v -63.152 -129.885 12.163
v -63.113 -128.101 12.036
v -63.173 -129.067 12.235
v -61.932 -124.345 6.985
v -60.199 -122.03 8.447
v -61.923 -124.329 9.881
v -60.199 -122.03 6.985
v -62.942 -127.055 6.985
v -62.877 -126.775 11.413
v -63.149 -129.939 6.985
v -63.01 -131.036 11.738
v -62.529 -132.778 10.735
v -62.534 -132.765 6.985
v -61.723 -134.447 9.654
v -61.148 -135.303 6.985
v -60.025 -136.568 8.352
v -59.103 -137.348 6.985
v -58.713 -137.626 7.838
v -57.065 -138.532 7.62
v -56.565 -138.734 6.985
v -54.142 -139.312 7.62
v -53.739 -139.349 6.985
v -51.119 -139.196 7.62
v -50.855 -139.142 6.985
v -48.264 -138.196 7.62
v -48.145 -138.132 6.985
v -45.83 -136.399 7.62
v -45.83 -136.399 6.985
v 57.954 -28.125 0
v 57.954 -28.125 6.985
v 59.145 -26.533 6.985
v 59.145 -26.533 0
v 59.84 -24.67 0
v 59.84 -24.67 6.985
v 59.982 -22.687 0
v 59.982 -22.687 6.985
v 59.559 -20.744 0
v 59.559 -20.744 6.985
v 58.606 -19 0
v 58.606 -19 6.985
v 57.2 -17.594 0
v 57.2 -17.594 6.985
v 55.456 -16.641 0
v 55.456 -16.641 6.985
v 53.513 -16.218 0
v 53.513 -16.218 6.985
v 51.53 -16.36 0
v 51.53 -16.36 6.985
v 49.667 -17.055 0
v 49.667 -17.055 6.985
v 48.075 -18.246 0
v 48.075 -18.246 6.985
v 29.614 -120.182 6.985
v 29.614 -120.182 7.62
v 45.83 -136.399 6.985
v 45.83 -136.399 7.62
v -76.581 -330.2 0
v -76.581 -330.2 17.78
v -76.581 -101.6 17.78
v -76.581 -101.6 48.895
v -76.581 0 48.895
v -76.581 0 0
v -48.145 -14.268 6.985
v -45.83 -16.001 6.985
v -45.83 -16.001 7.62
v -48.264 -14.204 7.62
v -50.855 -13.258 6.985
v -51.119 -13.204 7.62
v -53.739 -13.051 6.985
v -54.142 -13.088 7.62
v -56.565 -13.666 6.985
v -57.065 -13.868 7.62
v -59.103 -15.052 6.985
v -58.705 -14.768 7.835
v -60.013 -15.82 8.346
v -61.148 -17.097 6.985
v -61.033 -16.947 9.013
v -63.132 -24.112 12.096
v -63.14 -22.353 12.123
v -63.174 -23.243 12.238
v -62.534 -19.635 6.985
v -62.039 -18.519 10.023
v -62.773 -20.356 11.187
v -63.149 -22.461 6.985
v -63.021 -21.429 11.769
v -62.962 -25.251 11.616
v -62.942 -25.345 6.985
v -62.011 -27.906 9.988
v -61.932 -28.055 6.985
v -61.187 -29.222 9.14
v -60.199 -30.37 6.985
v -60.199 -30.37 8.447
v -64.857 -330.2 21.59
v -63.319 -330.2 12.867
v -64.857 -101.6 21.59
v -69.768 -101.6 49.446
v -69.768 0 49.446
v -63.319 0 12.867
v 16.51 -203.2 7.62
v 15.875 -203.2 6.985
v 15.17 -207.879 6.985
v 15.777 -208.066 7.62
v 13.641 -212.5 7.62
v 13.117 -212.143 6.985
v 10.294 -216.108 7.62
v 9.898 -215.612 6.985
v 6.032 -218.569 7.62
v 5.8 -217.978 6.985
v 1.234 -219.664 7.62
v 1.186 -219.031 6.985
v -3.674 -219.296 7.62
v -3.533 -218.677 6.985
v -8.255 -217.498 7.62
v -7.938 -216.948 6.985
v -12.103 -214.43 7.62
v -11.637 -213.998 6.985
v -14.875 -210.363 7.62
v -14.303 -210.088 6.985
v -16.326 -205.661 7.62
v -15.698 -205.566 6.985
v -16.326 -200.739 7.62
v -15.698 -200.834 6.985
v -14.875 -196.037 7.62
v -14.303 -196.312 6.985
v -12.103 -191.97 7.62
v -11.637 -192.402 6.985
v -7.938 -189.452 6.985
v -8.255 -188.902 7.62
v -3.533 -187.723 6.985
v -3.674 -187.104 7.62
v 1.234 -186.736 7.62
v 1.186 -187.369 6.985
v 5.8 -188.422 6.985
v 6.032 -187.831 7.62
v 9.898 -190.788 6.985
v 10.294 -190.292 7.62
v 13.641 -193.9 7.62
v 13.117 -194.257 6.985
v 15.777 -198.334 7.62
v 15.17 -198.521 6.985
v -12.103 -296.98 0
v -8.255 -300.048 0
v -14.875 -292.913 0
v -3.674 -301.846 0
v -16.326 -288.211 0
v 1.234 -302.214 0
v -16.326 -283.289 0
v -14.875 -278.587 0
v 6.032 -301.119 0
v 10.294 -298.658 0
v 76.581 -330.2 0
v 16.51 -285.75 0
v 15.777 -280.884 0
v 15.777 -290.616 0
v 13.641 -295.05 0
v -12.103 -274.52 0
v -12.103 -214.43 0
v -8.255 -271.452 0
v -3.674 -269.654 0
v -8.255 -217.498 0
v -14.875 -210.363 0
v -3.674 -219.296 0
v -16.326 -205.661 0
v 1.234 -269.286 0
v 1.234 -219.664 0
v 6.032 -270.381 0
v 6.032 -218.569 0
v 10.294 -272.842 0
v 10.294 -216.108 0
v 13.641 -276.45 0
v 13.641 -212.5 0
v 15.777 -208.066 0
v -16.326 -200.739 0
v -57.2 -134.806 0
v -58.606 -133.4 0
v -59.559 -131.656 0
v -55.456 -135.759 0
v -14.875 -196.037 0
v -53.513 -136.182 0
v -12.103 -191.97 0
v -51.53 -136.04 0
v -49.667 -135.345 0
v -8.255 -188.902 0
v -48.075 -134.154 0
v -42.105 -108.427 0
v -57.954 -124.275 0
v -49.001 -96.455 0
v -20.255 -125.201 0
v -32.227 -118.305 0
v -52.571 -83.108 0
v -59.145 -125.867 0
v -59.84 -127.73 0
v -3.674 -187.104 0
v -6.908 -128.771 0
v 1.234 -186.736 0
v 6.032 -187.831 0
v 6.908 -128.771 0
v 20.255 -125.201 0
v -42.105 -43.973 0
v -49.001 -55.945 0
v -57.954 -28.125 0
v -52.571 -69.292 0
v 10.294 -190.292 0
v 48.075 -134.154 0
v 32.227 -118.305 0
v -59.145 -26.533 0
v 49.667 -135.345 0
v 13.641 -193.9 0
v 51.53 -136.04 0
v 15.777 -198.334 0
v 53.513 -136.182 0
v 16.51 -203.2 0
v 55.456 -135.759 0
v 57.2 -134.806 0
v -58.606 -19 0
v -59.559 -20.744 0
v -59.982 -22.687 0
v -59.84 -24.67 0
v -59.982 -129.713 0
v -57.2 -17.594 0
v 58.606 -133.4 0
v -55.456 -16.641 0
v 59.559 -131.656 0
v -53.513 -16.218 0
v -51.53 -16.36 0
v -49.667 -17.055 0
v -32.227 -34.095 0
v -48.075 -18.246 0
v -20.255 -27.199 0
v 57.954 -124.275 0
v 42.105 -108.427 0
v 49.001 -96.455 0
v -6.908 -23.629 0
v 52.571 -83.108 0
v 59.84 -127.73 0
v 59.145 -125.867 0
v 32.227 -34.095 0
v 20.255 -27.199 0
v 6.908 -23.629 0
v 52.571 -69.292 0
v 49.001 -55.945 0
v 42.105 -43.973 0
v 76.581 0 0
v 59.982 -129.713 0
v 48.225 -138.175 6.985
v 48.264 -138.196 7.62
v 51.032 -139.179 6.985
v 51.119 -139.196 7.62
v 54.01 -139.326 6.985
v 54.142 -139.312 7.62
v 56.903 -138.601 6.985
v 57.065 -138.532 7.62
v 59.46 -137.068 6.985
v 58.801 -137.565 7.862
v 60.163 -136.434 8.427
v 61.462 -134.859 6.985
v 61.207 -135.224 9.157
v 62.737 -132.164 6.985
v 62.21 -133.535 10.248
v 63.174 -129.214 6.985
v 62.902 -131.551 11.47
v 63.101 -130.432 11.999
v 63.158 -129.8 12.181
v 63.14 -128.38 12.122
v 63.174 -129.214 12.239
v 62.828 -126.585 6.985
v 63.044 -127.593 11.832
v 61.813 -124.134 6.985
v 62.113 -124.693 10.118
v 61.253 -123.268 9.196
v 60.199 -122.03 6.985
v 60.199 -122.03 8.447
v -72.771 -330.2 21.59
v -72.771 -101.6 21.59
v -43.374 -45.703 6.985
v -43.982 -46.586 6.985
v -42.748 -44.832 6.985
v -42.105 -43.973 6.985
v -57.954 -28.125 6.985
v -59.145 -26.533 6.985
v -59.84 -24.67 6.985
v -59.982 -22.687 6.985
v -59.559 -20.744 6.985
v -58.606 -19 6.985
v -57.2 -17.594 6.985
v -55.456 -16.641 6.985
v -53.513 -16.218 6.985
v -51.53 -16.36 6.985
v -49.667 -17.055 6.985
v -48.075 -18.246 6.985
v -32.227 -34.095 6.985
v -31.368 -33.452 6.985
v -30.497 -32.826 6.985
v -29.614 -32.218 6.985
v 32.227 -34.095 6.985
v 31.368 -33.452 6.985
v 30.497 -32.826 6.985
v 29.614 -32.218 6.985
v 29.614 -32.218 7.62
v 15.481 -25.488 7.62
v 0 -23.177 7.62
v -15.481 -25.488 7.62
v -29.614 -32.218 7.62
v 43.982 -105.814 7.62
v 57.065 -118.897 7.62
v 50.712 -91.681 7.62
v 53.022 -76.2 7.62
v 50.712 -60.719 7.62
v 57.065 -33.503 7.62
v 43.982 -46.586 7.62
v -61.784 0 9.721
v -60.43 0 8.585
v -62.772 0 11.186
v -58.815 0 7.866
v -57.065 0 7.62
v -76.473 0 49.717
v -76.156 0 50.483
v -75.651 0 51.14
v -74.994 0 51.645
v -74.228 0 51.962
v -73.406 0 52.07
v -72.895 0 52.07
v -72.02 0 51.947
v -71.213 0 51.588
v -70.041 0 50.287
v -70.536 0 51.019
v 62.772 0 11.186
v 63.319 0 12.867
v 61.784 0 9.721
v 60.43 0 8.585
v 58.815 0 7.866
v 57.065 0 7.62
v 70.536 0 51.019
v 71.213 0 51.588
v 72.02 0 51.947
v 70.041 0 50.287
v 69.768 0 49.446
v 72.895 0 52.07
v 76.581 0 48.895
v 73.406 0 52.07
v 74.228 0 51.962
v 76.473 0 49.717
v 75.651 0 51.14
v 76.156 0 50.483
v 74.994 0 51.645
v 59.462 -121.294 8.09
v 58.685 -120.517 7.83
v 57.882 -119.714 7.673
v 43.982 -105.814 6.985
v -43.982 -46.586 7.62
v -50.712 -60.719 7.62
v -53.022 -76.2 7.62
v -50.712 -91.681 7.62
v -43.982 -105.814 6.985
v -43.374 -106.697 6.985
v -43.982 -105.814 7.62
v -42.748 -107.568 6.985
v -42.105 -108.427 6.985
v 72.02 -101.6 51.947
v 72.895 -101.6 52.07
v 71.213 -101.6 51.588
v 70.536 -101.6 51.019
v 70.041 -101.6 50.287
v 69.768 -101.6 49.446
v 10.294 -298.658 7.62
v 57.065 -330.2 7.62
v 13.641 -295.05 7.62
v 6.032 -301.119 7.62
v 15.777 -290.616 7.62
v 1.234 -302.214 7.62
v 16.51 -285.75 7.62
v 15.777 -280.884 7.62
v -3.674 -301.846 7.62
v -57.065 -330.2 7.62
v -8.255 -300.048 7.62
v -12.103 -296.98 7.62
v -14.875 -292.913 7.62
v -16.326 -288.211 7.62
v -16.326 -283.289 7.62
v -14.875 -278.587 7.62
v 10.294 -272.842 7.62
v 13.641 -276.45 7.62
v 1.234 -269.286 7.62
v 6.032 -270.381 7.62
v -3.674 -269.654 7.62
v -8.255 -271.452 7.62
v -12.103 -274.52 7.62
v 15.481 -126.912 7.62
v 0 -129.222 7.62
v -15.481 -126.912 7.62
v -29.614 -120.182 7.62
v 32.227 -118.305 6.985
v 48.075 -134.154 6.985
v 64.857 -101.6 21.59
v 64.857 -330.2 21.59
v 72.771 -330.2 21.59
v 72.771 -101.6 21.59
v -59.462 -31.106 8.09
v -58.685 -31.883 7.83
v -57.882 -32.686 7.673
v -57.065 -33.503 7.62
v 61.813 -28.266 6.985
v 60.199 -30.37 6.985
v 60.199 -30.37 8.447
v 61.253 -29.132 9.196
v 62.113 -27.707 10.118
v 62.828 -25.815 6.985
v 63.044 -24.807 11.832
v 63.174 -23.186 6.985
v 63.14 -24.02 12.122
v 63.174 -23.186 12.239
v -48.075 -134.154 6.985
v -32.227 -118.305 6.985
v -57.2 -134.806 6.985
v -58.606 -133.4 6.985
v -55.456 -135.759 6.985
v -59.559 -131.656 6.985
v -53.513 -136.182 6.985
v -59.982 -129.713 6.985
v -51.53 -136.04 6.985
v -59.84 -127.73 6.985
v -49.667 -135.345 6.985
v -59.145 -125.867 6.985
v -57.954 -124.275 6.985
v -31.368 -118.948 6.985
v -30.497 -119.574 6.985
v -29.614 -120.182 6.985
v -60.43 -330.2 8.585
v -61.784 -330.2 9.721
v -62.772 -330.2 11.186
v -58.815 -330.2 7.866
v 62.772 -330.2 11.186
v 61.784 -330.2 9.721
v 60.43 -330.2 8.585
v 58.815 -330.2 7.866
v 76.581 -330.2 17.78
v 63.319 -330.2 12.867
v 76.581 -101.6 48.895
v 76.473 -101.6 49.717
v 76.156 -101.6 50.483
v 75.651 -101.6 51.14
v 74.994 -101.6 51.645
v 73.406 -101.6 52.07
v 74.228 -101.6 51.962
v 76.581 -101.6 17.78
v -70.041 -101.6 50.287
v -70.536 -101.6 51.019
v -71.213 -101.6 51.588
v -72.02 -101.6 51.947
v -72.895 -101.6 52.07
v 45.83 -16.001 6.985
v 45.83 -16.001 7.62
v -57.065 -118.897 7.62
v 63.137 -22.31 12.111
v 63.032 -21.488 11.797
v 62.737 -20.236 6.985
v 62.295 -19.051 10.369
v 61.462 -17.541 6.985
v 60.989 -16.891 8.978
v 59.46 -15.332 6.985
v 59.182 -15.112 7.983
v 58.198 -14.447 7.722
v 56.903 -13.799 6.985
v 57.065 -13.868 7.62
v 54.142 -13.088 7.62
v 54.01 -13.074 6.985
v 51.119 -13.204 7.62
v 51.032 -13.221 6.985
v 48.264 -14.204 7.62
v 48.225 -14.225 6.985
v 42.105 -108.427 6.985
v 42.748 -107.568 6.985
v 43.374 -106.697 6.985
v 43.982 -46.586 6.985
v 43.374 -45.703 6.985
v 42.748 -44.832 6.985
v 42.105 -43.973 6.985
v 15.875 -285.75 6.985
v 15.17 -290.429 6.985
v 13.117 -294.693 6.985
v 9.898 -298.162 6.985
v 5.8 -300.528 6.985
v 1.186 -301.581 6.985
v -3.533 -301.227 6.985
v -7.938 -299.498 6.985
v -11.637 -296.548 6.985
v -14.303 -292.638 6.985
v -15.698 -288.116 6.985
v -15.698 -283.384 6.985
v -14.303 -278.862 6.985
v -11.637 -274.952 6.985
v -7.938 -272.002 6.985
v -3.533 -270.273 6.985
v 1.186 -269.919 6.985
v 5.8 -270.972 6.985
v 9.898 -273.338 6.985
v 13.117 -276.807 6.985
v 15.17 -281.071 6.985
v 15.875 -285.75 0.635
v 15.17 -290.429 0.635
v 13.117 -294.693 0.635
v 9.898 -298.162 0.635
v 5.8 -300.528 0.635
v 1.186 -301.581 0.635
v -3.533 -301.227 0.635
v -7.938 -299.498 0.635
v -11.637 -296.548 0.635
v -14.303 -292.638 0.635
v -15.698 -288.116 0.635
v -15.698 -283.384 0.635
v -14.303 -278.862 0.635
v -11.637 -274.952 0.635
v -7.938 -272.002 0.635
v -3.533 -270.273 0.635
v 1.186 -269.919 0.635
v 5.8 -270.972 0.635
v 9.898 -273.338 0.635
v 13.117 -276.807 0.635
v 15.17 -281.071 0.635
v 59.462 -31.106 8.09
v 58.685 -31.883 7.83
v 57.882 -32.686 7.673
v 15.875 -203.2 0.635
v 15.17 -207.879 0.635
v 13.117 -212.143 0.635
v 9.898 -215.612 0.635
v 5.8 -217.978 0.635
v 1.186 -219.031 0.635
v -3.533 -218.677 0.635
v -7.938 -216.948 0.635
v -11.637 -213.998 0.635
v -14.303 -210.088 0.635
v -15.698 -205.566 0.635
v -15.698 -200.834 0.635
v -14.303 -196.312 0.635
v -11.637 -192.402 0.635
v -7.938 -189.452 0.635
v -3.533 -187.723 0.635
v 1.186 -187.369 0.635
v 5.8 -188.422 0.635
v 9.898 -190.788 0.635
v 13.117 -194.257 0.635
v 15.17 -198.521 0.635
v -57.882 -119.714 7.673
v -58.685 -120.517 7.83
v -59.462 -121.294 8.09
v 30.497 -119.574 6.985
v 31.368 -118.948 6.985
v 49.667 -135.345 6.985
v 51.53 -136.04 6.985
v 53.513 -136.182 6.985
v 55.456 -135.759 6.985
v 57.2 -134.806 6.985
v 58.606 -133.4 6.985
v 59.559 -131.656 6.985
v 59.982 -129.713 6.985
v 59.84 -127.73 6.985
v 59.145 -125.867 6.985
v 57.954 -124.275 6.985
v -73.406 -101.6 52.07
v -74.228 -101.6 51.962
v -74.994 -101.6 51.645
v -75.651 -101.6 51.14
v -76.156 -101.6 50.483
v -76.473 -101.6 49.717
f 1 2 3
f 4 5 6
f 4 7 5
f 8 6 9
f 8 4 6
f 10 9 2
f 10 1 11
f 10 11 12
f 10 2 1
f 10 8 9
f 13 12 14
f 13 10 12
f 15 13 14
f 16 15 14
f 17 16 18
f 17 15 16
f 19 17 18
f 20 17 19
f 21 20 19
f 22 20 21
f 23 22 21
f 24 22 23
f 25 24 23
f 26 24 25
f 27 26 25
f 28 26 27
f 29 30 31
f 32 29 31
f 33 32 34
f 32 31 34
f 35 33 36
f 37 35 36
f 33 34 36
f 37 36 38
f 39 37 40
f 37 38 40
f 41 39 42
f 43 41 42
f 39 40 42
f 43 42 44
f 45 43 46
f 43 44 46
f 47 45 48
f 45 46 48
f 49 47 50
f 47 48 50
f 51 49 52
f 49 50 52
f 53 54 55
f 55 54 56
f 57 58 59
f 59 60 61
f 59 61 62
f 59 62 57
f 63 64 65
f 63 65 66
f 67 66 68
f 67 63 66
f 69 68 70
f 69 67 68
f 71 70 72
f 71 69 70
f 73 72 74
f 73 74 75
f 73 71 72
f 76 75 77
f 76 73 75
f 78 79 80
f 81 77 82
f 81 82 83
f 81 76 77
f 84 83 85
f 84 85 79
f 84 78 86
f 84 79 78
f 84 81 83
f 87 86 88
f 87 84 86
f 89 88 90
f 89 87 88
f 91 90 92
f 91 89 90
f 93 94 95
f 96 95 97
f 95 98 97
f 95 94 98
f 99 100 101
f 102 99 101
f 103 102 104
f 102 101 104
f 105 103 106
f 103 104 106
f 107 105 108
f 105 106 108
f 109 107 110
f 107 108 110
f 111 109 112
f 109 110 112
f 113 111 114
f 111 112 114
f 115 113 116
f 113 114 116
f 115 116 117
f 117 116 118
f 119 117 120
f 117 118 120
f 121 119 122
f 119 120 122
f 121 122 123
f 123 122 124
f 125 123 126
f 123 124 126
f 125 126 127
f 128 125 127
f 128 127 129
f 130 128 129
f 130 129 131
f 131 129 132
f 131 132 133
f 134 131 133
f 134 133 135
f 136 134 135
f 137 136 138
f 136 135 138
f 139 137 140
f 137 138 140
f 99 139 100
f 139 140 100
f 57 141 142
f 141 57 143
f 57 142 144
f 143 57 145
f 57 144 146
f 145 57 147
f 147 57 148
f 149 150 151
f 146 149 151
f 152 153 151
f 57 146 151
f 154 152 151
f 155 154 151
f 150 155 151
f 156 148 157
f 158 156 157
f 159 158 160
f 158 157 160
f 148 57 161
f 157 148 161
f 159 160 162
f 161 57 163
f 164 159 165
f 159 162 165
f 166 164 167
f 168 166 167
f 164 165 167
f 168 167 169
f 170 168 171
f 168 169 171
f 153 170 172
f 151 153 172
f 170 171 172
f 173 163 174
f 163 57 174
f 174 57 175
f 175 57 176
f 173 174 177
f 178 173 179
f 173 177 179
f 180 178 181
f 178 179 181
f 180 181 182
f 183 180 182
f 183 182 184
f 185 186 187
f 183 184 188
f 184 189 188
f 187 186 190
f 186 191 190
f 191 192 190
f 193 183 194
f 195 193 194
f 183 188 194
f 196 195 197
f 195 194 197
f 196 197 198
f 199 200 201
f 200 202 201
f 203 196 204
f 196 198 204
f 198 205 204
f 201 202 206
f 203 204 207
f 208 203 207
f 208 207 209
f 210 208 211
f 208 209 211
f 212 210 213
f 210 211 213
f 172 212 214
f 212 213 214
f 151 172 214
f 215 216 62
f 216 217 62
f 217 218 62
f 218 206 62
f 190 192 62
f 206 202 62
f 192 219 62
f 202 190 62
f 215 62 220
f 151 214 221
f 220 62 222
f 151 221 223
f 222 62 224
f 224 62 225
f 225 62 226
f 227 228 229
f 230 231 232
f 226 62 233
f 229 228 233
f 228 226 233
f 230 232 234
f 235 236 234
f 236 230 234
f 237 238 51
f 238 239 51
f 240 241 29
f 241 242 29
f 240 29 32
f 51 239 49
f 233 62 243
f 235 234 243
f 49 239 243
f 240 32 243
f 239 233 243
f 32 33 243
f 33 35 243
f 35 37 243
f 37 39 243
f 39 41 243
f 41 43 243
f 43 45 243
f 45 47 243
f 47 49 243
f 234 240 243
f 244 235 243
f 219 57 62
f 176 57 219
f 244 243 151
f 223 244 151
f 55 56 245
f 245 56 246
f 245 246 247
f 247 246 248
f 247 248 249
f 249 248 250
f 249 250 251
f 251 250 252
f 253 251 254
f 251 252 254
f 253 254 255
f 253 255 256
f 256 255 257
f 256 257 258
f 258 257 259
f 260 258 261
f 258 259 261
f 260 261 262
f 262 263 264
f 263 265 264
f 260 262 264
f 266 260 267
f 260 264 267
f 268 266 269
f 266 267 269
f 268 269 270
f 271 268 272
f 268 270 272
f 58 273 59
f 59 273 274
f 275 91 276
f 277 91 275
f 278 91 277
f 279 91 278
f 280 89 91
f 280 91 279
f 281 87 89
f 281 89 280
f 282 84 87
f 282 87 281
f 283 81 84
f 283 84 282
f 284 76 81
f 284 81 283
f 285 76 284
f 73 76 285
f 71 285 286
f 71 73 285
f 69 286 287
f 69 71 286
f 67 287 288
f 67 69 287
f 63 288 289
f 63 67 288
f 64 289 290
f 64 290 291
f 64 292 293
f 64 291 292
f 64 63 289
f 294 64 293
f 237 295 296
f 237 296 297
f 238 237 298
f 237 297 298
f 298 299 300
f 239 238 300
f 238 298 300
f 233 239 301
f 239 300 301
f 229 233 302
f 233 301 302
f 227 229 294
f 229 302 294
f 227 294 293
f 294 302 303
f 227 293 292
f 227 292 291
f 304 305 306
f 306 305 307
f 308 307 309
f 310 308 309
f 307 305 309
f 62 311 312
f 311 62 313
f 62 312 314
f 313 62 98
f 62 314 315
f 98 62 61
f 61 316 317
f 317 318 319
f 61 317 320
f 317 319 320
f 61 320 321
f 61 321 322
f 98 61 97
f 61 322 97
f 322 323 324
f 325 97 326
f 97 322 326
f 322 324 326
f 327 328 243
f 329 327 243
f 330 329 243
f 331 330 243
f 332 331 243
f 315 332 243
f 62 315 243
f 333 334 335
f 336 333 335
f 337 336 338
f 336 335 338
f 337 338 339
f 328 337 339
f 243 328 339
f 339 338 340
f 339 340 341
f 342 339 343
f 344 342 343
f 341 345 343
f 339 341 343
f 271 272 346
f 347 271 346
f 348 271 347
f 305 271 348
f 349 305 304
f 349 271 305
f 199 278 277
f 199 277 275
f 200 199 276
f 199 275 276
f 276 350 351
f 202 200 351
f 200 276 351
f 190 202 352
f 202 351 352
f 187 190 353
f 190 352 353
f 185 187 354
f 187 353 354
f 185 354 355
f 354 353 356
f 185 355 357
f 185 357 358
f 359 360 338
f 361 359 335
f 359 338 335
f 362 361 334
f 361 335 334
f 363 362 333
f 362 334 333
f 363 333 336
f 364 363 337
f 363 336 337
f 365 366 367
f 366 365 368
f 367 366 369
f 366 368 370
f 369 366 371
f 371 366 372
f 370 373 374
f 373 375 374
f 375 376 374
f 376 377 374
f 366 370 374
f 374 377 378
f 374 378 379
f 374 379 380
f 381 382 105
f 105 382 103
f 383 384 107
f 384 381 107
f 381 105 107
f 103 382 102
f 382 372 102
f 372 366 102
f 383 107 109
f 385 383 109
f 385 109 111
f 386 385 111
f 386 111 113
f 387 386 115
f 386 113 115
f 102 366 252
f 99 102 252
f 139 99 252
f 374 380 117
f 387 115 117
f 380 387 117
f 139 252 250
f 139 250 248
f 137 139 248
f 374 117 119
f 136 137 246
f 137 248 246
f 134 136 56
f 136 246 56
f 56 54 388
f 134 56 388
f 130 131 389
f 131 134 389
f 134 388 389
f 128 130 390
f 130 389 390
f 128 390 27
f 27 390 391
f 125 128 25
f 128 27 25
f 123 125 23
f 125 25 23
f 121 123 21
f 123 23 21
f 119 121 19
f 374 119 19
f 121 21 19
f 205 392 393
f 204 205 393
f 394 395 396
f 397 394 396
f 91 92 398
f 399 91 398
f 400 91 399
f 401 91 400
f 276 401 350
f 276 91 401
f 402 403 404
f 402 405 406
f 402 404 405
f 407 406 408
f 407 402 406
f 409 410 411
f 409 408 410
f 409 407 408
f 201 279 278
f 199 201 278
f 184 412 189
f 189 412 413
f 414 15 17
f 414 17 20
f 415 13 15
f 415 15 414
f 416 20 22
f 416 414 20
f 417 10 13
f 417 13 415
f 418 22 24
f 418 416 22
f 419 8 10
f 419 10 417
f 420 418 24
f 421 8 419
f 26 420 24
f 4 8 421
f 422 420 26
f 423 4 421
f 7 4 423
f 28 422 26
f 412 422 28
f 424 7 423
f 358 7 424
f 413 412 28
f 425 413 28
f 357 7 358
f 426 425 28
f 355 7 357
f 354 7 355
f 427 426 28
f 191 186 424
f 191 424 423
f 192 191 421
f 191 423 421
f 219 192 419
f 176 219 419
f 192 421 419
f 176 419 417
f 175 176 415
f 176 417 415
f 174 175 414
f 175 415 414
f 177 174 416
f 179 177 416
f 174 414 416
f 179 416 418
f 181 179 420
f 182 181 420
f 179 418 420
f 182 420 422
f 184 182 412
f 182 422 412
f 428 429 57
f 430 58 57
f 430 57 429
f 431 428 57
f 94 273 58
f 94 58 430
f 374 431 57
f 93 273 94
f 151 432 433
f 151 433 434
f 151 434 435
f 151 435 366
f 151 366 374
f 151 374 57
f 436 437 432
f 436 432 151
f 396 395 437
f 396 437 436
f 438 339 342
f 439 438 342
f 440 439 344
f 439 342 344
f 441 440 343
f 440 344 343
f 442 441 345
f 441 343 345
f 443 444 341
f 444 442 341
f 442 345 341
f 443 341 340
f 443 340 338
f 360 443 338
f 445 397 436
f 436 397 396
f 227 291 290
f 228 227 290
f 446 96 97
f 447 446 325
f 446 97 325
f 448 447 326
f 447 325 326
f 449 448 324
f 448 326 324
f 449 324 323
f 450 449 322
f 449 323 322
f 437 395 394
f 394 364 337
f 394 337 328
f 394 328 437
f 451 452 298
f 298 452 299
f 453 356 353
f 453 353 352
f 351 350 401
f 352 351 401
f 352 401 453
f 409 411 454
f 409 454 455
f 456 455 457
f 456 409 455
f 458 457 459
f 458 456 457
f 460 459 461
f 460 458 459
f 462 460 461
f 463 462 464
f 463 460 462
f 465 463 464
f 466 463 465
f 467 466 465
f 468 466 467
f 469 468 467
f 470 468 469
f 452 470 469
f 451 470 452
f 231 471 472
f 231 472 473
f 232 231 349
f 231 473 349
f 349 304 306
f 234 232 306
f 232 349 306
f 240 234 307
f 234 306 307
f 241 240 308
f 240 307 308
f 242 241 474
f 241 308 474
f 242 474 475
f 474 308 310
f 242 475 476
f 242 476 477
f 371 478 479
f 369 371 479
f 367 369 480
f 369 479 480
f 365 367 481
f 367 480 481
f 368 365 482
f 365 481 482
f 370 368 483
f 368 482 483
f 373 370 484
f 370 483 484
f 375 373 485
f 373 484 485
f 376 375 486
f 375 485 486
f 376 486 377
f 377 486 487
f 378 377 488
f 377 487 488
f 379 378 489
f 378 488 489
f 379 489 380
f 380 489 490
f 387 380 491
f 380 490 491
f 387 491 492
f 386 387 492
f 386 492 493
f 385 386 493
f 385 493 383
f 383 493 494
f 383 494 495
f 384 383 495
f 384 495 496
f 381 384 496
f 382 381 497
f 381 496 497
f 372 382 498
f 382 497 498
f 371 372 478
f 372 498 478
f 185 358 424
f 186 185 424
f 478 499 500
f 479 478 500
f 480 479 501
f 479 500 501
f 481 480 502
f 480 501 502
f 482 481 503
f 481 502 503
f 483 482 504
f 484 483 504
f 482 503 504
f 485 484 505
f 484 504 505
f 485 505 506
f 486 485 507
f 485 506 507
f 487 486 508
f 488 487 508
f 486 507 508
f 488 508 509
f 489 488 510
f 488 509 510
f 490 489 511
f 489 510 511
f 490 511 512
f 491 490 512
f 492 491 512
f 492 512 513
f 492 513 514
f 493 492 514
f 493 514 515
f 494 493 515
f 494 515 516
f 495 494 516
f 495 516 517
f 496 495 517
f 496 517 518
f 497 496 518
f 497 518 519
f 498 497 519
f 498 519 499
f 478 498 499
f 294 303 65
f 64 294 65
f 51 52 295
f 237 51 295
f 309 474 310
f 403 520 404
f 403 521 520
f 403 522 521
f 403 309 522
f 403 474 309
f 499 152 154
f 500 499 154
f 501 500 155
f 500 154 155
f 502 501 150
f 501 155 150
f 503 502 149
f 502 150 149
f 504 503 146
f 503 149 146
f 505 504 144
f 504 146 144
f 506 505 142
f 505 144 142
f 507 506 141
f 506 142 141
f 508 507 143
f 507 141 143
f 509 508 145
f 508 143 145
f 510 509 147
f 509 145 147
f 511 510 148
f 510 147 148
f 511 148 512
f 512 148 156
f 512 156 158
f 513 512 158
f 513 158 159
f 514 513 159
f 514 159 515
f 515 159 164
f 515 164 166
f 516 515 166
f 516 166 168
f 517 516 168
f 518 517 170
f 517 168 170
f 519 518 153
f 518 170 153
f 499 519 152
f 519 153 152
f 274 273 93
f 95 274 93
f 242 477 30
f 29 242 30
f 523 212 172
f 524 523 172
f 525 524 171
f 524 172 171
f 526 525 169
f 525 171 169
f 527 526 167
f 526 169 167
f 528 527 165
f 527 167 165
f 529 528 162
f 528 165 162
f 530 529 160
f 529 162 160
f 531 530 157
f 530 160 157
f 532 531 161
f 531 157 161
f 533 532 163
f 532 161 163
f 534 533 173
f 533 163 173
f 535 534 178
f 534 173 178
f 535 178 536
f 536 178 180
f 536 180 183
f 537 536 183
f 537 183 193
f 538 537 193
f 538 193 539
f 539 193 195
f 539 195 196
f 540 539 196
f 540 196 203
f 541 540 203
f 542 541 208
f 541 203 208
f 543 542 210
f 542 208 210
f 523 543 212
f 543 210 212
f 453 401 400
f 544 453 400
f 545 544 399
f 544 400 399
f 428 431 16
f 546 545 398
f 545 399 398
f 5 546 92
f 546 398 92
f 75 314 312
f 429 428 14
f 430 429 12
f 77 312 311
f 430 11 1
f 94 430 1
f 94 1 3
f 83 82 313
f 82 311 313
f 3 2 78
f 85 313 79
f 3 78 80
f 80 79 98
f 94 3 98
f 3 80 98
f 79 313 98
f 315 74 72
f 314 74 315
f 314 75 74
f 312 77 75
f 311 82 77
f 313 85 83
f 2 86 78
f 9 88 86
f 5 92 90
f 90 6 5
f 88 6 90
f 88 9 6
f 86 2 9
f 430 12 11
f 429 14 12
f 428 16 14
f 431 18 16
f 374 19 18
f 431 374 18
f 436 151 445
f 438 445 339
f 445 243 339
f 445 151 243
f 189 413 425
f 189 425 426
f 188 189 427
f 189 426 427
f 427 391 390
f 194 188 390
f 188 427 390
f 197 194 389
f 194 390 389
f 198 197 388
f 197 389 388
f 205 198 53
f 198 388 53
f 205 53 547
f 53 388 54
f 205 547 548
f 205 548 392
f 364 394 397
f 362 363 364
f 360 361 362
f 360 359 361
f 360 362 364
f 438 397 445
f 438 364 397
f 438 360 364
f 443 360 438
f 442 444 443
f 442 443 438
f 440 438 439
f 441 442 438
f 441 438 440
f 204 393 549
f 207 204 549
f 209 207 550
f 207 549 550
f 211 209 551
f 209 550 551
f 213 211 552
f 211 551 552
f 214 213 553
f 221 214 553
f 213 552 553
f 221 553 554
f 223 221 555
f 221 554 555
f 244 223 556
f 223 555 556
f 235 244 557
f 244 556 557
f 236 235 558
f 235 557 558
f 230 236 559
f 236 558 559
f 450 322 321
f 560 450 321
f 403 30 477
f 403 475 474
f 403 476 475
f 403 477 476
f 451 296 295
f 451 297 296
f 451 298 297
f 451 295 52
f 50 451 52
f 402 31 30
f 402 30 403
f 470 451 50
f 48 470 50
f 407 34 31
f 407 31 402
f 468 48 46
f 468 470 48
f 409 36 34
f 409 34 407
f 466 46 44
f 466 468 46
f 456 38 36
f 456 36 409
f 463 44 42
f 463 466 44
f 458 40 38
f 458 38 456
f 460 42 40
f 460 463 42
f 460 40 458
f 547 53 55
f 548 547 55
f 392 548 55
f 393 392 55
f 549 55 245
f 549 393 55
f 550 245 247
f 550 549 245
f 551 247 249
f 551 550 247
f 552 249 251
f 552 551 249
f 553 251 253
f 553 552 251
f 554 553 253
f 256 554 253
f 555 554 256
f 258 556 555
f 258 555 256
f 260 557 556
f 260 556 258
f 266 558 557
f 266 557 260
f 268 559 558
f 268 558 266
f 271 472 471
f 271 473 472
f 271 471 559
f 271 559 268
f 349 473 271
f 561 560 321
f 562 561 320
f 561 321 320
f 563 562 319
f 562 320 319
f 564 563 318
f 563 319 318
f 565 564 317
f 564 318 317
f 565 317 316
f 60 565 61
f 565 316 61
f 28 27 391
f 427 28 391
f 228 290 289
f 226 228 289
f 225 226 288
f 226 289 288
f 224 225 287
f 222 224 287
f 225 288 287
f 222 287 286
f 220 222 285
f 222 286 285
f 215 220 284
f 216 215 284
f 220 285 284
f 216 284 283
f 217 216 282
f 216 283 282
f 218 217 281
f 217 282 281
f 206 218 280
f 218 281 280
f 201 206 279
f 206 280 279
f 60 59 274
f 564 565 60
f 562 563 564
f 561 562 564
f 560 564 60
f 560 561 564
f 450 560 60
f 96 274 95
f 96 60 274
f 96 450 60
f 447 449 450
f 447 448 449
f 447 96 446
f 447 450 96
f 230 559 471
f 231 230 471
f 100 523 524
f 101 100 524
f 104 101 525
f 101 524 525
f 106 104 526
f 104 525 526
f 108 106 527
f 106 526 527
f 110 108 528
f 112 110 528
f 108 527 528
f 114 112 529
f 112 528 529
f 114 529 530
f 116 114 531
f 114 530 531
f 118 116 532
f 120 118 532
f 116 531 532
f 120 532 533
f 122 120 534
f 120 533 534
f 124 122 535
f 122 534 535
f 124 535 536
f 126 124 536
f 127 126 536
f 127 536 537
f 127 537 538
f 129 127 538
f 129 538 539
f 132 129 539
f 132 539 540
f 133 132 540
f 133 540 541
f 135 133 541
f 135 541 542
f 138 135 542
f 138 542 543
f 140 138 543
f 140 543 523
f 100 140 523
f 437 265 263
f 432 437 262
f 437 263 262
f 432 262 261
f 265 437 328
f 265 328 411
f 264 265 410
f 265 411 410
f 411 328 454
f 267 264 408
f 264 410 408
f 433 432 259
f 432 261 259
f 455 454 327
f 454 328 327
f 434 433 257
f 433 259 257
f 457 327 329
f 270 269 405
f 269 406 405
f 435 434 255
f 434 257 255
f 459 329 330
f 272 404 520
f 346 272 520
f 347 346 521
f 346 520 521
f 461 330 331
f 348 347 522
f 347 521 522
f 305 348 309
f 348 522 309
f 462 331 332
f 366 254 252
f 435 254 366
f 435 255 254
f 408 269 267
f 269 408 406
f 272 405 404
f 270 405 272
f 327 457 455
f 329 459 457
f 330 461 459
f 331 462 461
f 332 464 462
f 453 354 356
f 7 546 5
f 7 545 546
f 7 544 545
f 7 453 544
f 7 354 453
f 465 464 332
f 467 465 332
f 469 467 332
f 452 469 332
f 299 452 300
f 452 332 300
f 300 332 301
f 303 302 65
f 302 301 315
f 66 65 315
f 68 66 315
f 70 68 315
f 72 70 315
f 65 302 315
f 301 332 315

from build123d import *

# Parameters (mm, degrees)
F1_DEPTH  = 330.2
F2_W      = 165.1
F2_H      = 35.56
F3_DEPTH  = 228.6
F4_SIZE   = 3.81
F6_DEPTH  = 25.4
F8_DEPTH  = 0.635
F9_DEPTH  = 25.4
F10_R     = 15.875
F11_DEPTH = 25.4
F12_SIZE  = 0.635


with BuildPart() as f1:
    # F0 (on Front) → F1 (new body)
    with BuildSketch(Plane.XZ):
        with BuildLine():
            Line((-76.581, 48.895), (-76.581, 0))
            Line((-76.581, 0), (76.581, 0))
            Line((76.581, 0), (76.581, 48.895))
            ThreePointArc((76.581, 48.895), (75.6510640303, 51.1400640303), (73.406, 52.07))
            Line((73.406, 52.07), (72.895141329, 52.07))
            ThreePointArc((72.895141329, 52.07), (70.8542906682, 51.3271911069), (69.7683767132, 49.4463329641))
            Line((69.7683767132, 49.4463329641), (63.3185122812, 12.8673340718))
            ThreePointArc((63.3185122812, 12.8673340718), (61.146684371, 9.1056177862), (57.0649830495, 7.62))
            Line((57.0649830495, 7.62), (0, 7.62))
            Line((0, 7.62), (-57.0649830495, 7.62))
            ThreePointArc((-57.0649830495, 7.62), (-61.146684371, 9.1056177862), (-63.3185122812, 12.8673340718))
            Line((-63.3185122812, 12.8673340718), (-69.7683767132, 49.4463329641))
            ThreePointArc((-69.7683767132, 49.4463329641), (-70.8542906682, 51.3271911069), (-72.895141329, 52.07))
            Line((-72.895141329, 52.07), (-73.406, 52.07))
            ThreePointArc((-73.406, 52.07), (-75.6510640303, 51.1400640303), (-76.581, 48.895))
        make_face()
    extrude(amount=F1_DEPTH)

    # F2 (on face) → F3 (cut)
    with BuildSketch(Plane.XZ.offset(330.2)):
        with Locations((0, 39.37)):
            Rectangle(F2_W, F2_H)
    extrude(amount=-F3_DEPTH, mode=Mode.SUBTRACT)

    # F4
    f4_edges = [f1.edges().sort_by_distance(p)[0] for p in [
        (76.581, -215.9, 21.59),
        (-76.581, -215.9, 21.59),
    ]]
    chamfer(f4_edges, length=F4_SIZE)

    # F5 (on face) → F6 (cut)
    with BuildSketch(Plane.XY.offset(7.62)):
        with BuildLine():
            Line((-57.9536338645, -28.1246478687), (-42.1049536604, -43.9733280728))
            ThreePointArc((-42.1049536604, -43.9733280728), (-53.0225, -76.2), (-42.1049536604, -108.4266719272))
            Line((-42.1049536604, -108.4266719272), (-57.9536338645, -124.2753521313))
            ThreePointArc((-57.9536338645, -124.2753521313), (-57.9536338645, -134.1536338645), (-48.0753521313, -134.1536338645))
            Line((-48.0753521313, -134.1536338645), (-32.2266719272, -118.3049536604))
            ThreePointArc((-32.2266719272, -118.3049536604), (0, -129.2225), (32.2266719272, -118.3049536604))
            Line((32.2266719272, -118.3049536604), (48.0753521313, -134.1536338645))
            ThreePointArc((48.0753521313, -134.1536338645), (57.9536338645, -134.1536338645), (57.9536338645, -124.2753521313))
            Line((57.9536338645, -124.2753521313), (42.1049536604, -108.4266719272))
            ThreePointArc((42.1049536604, -108.4266719272), (53.0225, -76.2), (42.1049536604, -43.9733280728))
            Line((42.1049536604, -43.9733280728), (57.9536338645, -28.1246478687))
            ThreePointArc((57.9536338645, -28.1246478687), (57.9536338645, -18.2463661355), (48.0753521313, -18.2463661355))
            Line((48.0753521313, -18.2463661355), (32.2266719272, -34.0950463396))
            ThreePointArc((32.2266719272, -34.0950463396), (0, -23.1775), (-32.2266719272, -34.0950463396))
            Line((-32.2266719272, -34.0950463396), (-48.0753521313, -18.2463661355))
            ThreePointArc((-48.0753521313, -18.2463661355), (-57.9536338645, -18.2463661355), (-57.9536338645, -28.1246478687))
        make_face()
    extrude(amount=-F6_DEPTH, mode=Mode.SUBTRACT)

    # F7 (on face) → F8 (cut)
    with BuildSketch(Plane.XY.offset(7.62)):
        with BuildLine():
            ThreePointArc((-60.1986978948, -30.3697118989), (-49.1264293251, -32.5721230524), (-42.8544929979, -23.1855070021))
            ThreePointArc((-42.8544929979, -23.1855070021), (-43.6278769476, -19.2974433292), (-45.8302881011, -16.0013021052))
            ThreePointArc((-45.8302881011, -16.0013021052), (-60.1986978948, -16.0013021052), (-60.1986978948, -30.3697118989))
        make_face()
        with BuildLine():
            ThreePointArc((-45.8302881011, -16.0013021052), (-43.6278769476, -19.2974433292), (-42.8544929979, -23.1855070021))
            ThreePointArc((-42.8544929979, -23.1855070021), (-49.1264293251, -32.5721230524), (-60.1986978948, -30.3697118989))
            Line((-60.1986978948, -30.3697118989), (-43.1340409794, -47.4343688143))
            Line((-43.1340409794, -47.4343688143), (-28.767801471, -33.0637887353))
            Line((-28.767801471, -33.0637887353), (-45.8302881011, -16.0013021052))
        make_face()
        with BuildLine():
            ThreePointArc((-45.8302881011, -136.3986978948), (-43.6278769476, -133.1025566708), (-42.8544929979, -129.2144929979))
            ThreePointArc((-42.8544929979, -129.2144929979), (-49.1264293251, -119.8278769476), (-60.1986978948, -122.0302881011))
            ThreePointArc((-60.1986978948, -122.0302881011), (-60.1986978948, -136.3986978948), (-45.8302881011, -136.3986978948))
        make_face()
        with BuildLine():
            ThreePointArc((-60.1986978948, -122.0302881011), (-49.1264293251, -119.8278769476), (-42.8544929979, -129.2144929979))
            ThreePointArc((-42.8544929979, -129.2144929979), (-43.6278769476, -133.1025566708), (-45.8302881011, -136.3986978948))
            Line((-45.8302881011, -136.3986978948), (-28.7656311857, -119.3340409794))
            Line((-28.7656311857, -119.3340409794), (-43.1362112647, -104.967801471))
            Line((-43.1362112647, -104.967801471), (-60.1986978948, -122.0302881011))
        make_face()
        with BuildLine():
            ThreePointArc((45.8302881011, -136.3986978948), (56.9025566708, -138.6011090482), (63.1744929979, -129.2144929979))
            ThreePointArc((63.1744929979, -129.2144929979), (62.4011090482, -125.3264293251), (60.1986978948, -122.0302881011))
            ThreePointArc((60.1986978948, -122.0302881011), (45.8302881011, -122.0302881011), (45.8302881011, -136.3986978948))
        make_face()
        with BuildLine():
            ThreePointArc((45.8302881011, -136.3986978948), (45.8302881011, -122.0302881011), (60.1986978948, -122.0302881011))
            Line((60.1986978948, -122.0302881011), (43.1340409794, -104.9656311857))
            Line((43.1340409794, -104.9656311857), (28.767801471, -119.3362112647))
            Line((28.767801471, -119.3362112647), (45.8302881011, -136.3986978948))
        make_face()
        with BuildLine():
            ThreePointArc((60.1986978948, -30.3697118989), (62.4011090482, -27.0735706749), (63.1744929979, -23.1855070021))
            ThreePointArc((63.1744929979, -23.1855070021), (56.9025566708, -13.7988909518), (45.8302881011, -16.0013021052))
            ThreePointArc((45.8302881011, -16.0013021052), (45.8302881011, -30.3697118989), (60.1986978948, -30.3697118989))
        make_face()
        with BuildLine():
            ThreePointArc((60.1986978948, -30.3697118989), (45.8302881011, -30.3697118989), (45.8302881011, -16.0013021052))
            Line((45.8302881011, -16.0013021052), (28.7656311857, -33.0659590206))
            Line((28.7656311857, -33.0659590206), (43.1362112647, -47.432198529))
            Line((43.1362112647, -47.432198529), (60.1986978948, -30.3697118989))
        make_face()
    extrude(amount=-F8_DEPTH, mode=Mode.SUBTRACT)

    # F7 (on face) → F9 (cut)
    with BuildSketch(Plane.XY.offset(7.62)):
        with BuildLine():
            ThreePointArc((-60.1986978948, -30.3697118989), (-49.1264293251, -32.5721230524), (-42.8544929979, -23.1855070021))
            ThreePointArc((-42.8544929979, -23.1855070021), (-43.6278769476, -19.2974433292), (-45.8302881011, -16.0013021052))
            ThreePointArc((-45.8302881011, -16.0013021052), (-60.1986978948, -16.0013021052), (-60.1986978948, -30.3697118989))
        make_face()
        with BuildLine():
            ThreePointArc((-45.8302881011, -16.0013021052), (-43.6278769476, -19.2974433292), (-42.8544929979, -23.1855070021))
            ThreePointArc((-42.8544929979, -23.1855070021), (-49.1264293251, -32.5721230524), (-60.1986978948, -30.3697118989))
            Line((-60.1986978948, -30.3697118989), (-43.1340409794, -47.4343688143))
            Line((-43.1340409794, -47.4343688143), (-28.767801471, -33.0637887353))
            Line((-28.767801471, -33.0637887353), (-45.8302881011, -16.0013021052))
        make_face()
        with BuildLine():
            ThreePointArc((-45.8302881011, -136.3986978948), (-43.6278769476, -133.1025566708), (-42.8544929979, -129.2144929979))
            ThreePointArc((-42.8544929979, -129.2144929979), (-49.1264293251, -119.8278769476), (-60.1986978948, -122.0302881011))
            ThreePointArc((-60.1986978948, -122.0302881011), (-60.1986978948, -136.3986978948), (-45.8302881011, -136.3986978948))
        make_face()
        with BuildLine():
            ThreePointArc((-60.1986978948, -122.0302881011), (-49.1264293251, -119.8278769476), (-42.8544929979, -129.2144929979))
            ThreePointArc((-42.8544929979, -129.2144929979), (-43.6278769476, -133.1025566708), (-45.8302881011, -136.3986978948))
            Line((-45.8302881011, -136.3986978948), (-28.7656311857, -119.3340409794))
            Line((-28.7656311857, -119.3340409794), (-43.1362112647, -104.967801471))
            Line((-43.1362112647, -104.967801471), (-60.1986978948, -122.0302881011))
        make_face()
        with BuildLine():
            ThreePointArc((45.8302881011, -136.3986978948), (56.9025566708, -138.6011090482), (63.1744929979, -129.2144929979))
            ThreePointArc((63.1744929979, -129.2144929979), (62.4011090482, -125.3264293251), (60.1986978948, -122.0302881011))
            ThreePointArc((60.1986978948, -122.0302881011), (45.8302881011, -122.0302881011), (45.8302881011, -136.3986978948))
        make_face()
        with BuildLine():
            ThreePointArc((45.8302881011, -136.3986978948), (45.8302881011, -122.0302881011), (60.1986978948, -122.0302881011))
            Line((60.1986978948, -122.0302881011), (43.1340409794, -104.9656311857))
            Line((43.1340409794, -104.9656311857), (28.767801471, -119.3362112647))
            Line((28.767801471, -119.3362112647), (45.8302881011, -136.3986978948))
        make_face()
        with BuildLine():
            ThreePointArc((60.1986978948, -30.3697118989), (62.4011090482, -27.0735706749), (63.1744929979, -23.1855070021))
            ThreePointArc((63.1744929979, -23.1855070021), (56.9025566708, -13.7988909518), (45.8302881011, -16.0013021052))
            ThreePointArc((45.8302881011, -16.0013021052), (45.8302881011, -30.3697118989), (60.1986978948, -30.3697118989))
        make_face()
        with BuildLine():
            ThreePointArc((60.1986978948, -30.3697118989), (45.8302881011, -30.3697118989), (45.8302881011, -16.0013021052))
            Line((45.8302881011, -16.0013021052), (28.7656311857, -33.0659590206))
            Line((28.7656311857, -33.0659590206), (43.1362112647, -47.432198529))
            Line((43.1362112647, -47.432198529), (60.1986978948, -30.3697118989))
        make_face()
    extrude(amount=F9_DEPTH, mode=Mode.SUBTRACT)

    # F10 (on face) → F11 (cut)
    with BuildSketch(Plane(origin=(0, 0, 0), x_dir=(1, 0, 0), z_dir=(0, 0, -1))):
        with Locations((0, 285.75)):
            Circle(F10_R)
        with Locations((0, 203.2)):
            Circle(F10_R)
    extrude(amount=-F11_DEPTH, mode=Mode.SUBTRACT)

    # F12
    f12_edges = [f1.edges().sort_by_distance(p)[0] for p in [
        (-15.875, -203.2, 7.62),
        (-15.875, -203.2, 0),
        (-15.875, -285.75, 0),
        (-15.875, -285.75, 7.62),
    ]]
    chamfer(f12_edges, length=F12_SIZE)


solid = f1.part
